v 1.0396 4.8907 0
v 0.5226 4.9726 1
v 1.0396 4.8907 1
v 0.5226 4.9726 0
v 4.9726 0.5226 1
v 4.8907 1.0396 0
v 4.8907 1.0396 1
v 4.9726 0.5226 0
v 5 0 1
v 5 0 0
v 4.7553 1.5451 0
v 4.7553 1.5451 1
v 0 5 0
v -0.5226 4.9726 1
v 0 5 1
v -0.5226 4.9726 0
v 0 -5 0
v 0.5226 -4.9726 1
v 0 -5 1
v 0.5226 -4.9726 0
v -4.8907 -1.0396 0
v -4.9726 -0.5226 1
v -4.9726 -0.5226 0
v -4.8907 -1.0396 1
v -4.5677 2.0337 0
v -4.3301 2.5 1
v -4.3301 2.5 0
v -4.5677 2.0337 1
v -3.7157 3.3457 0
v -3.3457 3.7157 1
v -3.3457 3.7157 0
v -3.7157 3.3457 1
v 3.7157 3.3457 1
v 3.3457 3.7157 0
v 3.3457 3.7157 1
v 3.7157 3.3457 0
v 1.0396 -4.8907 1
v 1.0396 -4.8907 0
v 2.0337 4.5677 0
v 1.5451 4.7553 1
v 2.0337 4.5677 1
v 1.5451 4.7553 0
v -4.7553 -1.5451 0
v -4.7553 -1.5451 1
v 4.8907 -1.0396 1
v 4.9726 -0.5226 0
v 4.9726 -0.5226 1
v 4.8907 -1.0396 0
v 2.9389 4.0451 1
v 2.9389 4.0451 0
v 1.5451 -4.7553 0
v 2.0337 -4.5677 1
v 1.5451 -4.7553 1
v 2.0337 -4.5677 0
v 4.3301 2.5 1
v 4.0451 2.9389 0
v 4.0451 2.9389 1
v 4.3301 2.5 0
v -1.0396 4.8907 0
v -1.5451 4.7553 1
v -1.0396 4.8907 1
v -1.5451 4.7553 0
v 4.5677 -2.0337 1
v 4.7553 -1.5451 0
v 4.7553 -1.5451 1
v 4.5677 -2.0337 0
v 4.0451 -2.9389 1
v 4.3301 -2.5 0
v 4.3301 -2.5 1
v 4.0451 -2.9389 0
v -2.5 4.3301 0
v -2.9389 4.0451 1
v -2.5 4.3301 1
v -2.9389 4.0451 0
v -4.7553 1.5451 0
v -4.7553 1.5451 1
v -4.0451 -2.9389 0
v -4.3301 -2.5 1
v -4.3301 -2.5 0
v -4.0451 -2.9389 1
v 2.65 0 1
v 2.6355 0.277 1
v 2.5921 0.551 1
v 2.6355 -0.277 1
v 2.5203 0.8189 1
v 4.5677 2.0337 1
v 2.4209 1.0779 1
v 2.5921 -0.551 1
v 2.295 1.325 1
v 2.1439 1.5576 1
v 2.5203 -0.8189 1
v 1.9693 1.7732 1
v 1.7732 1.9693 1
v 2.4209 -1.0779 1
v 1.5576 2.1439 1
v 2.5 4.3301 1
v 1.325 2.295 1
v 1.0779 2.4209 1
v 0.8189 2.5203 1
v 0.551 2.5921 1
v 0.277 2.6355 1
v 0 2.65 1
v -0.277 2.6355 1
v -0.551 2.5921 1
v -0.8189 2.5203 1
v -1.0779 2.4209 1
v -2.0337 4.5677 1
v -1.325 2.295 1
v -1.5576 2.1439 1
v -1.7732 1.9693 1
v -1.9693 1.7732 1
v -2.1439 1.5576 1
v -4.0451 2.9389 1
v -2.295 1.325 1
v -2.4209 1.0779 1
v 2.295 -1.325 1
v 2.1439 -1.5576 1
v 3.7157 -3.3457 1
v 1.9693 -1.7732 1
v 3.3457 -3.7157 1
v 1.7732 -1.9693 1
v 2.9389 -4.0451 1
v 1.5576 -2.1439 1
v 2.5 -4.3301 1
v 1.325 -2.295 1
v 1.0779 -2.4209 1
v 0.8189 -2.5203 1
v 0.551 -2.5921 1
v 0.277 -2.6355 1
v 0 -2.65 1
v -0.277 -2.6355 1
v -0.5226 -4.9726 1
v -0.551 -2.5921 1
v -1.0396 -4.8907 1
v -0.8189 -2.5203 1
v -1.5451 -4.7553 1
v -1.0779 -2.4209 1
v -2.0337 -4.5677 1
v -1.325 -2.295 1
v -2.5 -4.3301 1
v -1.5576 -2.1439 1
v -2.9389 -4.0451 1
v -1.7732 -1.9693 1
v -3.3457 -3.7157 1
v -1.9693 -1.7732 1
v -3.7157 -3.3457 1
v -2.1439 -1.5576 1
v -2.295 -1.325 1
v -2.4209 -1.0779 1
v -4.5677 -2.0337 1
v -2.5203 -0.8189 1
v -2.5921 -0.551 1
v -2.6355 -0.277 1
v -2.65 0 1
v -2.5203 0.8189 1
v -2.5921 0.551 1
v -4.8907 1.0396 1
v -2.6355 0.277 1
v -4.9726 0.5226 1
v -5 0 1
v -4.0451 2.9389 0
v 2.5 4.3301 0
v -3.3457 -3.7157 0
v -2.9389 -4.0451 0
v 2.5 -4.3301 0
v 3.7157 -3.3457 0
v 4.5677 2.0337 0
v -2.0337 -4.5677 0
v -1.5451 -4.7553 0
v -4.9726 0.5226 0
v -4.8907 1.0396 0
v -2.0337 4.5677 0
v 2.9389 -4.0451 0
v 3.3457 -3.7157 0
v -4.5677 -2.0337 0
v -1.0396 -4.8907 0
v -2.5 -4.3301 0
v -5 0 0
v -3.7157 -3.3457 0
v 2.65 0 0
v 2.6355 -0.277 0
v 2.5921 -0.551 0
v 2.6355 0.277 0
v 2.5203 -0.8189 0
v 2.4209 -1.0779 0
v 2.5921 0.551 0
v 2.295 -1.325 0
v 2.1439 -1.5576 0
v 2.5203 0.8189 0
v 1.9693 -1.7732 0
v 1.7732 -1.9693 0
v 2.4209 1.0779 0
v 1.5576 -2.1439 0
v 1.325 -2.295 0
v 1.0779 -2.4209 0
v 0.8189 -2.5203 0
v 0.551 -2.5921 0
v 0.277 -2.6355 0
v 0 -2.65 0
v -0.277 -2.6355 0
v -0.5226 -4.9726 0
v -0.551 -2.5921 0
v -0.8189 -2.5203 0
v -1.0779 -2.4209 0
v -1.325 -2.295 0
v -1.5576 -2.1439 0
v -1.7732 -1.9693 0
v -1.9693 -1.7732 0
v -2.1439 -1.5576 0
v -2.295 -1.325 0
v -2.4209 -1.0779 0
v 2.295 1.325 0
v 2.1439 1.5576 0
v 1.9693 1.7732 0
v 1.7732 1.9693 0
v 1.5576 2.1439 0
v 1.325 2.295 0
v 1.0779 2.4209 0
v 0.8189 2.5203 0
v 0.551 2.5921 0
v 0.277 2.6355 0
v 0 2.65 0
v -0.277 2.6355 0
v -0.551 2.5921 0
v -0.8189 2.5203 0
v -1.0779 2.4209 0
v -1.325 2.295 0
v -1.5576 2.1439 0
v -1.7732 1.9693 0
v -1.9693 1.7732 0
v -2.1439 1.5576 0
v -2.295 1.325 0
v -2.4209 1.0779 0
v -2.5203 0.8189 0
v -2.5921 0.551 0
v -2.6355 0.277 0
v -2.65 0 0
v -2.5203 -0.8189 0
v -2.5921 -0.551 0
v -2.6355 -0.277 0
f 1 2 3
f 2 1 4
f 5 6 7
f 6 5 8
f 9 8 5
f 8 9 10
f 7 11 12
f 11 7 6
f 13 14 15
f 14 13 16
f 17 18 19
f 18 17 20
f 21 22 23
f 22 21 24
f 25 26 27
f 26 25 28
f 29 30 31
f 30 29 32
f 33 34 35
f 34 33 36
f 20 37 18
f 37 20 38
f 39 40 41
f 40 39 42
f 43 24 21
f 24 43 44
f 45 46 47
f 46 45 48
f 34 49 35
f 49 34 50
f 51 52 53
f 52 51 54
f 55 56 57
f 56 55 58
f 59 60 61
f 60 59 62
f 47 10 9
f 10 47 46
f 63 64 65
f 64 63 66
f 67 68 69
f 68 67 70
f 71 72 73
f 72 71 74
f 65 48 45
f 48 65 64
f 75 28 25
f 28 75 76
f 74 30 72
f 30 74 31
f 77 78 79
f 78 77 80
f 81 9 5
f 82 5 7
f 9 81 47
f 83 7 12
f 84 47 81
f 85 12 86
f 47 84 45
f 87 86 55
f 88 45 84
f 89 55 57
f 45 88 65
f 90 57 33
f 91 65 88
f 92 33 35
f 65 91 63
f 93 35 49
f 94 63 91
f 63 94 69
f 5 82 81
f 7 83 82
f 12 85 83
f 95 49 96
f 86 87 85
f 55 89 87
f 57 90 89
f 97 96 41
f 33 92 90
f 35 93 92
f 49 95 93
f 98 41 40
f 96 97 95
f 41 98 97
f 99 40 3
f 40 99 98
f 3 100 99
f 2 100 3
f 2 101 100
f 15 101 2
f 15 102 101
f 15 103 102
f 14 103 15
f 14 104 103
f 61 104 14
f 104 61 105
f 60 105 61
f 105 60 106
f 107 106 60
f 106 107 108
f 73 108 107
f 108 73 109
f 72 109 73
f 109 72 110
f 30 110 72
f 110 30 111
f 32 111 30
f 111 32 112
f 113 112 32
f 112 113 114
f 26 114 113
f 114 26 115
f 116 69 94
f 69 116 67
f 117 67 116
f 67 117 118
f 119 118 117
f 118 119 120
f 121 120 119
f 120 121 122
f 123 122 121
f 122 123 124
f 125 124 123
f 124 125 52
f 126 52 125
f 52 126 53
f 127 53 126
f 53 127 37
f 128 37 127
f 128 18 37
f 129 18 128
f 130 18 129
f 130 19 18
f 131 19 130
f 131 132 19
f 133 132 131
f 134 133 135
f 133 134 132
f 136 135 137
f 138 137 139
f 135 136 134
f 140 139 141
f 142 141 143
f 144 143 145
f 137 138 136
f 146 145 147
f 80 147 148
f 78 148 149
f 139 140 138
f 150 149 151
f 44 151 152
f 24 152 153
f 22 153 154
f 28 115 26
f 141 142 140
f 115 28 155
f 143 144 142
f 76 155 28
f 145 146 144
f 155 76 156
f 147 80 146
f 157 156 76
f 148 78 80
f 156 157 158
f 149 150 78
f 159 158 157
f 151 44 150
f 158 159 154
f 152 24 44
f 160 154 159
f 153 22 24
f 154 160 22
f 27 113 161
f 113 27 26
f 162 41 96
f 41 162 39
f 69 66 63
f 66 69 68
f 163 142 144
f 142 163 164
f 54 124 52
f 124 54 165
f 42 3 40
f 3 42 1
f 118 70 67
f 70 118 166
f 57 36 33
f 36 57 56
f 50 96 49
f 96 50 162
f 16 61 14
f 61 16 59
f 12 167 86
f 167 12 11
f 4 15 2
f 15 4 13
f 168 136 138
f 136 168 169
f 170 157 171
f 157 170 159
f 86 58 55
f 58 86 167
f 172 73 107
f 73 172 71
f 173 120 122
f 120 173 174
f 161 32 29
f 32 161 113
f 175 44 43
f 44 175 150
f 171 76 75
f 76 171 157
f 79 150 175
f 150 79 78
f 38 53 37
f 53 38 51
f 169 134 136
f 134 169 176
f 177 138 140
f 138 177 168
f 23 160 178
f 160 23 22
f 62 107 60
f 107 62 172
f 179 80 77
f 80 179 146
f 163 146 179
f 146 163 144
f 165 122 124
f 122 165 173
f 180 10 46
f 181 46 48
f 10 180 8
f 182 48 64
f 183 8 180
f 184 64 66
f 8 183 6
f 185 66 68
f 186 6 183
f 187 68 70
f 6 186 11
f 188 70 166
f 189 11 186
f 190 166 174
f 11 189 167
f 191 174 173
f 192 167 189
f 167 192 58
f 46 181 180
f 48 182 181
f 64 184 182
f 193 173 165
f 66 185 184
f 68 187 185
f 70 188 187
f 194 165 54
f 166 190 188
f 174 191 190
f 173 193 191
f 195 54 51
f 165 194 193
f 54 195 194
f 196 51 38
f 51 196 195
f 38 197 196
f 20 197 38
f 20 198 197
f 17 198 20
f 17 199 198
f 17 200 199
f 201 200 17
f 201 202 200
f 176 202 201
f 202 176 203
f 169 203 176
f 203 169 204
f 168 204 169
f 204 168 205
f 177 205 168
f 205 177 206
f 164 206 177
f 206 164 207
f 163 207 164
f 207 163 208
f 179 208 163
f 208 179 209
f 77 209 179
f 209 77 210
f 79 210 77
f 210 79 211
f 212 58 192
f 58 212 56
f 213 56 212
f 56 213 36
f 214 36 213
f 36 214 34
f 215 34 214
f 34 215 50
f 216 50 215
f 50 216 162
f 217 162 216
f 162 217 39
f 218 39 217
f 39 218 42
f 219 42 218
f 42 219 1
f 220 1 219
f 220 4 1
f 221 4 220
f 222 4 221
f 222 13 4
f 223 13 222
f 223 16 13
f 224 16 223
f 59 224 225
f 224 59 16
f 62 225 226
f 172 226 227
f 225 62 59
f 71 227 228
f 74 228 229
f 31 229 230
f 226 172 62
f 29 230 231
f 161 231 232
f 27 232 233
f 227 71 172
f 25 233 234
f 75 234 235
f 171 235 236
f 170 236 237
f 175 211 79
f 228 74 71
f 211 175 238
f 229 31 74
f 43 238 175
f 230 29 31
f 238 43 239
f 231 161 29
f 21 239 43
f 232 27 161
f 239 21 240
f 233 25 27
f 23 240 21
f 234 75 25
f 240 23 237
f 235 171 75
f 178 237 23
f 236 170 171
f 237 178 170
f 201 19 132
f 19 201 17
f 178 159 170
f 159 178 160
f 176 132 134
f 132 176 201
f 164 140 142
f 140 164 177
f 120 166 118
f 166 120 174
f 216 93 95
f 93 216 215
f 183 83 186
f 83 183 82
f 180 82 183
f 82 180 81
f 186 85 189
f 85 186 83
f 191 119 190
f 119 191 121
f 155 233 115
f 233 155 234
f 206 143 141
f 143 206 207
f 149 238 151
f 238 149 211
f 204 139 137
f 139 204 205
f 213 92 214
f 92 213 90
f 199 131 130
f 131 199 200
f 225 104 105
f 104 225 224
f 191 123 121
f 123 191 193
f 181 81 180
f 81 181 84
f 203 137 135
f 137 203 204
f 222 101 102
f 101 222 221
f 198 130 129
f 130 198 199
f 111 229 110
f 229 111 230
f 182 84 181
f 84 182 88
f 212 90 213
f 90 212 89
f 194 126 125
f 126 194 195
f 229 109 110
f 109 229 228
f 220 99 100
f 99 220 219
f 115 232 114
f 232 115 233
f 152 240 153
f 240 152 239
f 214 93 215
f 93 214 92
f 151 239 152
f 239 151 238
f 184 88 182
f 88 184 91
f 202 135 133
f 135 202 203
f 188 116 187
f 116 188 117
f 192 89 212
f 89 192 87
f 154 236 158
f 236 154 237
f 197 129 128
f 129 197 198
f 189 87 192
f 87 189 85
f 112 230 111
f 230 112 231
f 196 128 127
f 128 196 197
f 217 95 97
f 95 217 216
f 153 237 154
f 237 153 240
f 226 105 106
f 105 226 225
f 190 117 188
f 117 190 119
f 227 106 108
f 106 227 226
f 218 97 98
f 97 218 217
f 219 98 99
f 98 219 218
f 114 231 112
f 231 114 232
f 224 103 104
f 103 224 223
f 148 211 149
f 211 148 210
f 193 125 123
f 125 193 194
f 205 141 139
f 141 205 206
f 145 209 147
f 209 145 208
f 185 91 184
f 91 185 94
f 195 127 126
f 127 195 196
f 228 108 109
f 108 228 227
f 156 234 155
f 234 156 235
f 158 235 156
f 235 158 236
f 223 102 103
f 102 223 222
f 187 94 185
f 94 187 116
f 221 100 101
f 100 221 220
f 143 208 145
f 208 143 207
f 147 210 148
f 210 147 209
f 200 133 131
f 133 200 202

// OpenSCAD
// Flat metric washer.
$fn = 60;
eps = 0.02;
inner_d = 5.3;
outer_d = 10;
thickness = 1;
difference() {
    cylinder(d = outer_d, h = thickness);
    translate([0, 0, -eps]) cylinder(d = inner_d, h = thickness + 2 * eps);
}
